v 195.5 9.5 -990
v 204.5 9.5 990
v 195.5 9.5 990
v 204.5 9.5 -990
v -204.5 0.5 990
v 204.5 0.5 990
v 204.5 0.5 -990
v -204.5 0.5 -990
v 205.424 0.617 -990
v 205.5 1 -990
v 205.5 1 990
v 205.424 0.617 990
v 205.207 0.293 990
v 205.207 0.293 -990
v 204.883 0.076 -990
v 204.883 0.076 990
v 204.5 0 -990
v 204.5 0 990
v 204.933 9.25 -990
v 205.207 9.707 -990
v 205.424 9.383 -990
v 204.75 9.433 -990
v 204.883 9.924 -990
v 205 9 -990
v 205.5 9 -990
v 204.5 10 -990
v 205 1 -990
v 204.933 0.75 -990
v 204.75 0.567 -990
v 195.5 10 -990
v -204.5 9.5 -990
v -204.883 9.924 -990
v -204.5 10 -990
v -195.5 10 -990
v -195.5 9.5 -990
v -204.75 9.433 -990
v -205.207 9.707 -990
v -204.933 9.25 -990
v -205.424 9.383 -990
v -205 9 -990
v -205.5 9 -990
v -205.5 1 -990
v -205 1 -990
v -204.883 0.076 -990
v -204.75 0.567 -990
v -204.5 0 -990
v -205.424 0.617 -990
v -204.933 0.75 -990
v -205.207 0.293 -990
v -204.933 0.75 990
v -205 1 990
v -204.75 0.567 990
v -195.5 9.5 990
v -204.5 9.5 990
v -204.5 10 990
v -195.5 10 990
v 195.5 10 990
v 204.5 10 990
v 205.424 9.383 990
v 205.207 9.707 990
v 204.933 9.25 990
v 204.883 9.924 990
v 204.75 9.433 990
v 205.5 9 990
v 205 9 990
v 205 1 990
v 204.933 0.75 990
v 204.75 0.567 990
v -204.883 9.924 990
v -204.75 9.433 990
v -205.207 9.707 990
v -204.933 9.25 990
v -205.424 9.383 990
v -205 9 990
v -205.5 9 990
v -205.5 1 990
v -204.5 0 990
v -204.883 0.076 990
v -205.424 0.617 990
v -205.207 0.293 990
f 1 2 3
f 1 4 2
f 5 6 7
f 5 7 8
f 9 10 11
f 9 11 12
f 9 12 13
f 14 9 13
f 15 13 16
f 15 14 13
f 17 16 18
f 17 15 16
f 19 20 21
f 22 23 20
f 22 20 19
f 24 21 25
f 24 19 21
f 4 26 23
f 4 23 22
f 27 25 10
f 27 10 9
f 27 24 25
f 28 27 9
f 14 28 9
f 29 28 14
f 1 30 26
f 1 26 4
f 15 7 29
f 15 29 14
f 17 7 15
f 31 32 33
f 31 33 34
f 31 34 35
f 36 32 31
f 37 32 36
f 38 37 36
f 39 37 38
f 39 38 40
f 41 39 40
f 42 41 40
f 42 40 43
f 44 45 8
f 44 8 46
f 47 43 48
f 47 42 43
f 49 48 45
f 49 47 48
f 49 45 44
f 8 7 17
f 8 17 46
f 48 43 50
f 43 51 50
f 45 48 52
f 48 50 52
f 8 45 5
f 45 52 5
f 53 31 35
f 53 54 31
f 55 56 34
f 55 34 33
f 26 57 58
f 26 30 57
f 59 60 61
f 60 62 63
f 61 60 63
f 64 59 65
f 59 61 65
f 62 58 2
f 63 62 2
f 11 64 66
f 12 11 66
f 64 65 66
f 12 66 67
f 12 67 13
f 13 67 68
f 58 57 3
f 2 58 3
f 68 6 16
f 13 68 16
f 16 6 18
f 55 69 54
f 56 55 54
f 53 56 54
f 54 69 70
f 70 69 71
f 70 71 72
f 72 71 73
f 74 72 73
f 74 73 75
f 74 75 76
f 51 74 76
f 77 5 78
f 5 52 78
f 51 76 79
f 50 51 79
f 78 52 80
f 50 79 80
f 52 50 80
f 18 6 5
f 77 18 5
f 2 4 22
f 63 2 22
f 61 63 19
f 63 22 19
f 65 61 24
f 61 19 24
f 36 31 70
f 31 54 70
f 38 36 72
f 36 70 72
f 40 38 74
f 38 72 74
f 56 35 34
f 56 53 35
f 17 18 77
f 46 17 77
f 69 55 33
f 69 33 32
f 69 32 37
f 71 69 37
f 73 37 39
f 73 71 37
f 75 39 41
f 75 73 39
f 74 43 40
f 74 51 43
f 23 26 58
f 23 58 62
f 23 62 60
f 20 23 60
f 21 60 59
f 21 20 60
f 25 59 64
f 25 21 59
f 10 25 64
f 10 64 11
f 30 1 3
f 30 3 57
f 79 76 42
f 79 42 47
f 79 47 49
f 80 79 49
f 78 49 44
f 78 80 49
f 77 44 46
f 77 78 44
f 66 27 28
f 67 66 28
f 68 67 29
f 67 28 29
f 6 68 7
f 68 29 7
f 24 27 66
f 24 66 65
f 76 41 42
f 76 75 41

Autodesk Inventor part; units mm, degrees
ref_plane "YZ Plane" through (0, 0, 0) normal (1, 0, 0) x (0, 1, 0)
ref_plane "XZ Plane" through (0, 0, 0) normal (0, 1, 0) x (-1, 0, 0)
ref_plane "XY Plane" through (0, 0, 0) normal (0, 0, 1) x (1, 0, 0)
sketch "Sketch6" plane through (0, 0, 0) normal (0, 1, 0) x (-1, 0, 0)
  line L0 (205.5, -990) -> (-205.5, -990)
  line L1 (-205.5, -990) -> (-205.5, 990)
  line L2 (-205.5, 990) -> (205.5, 990)
  line L3 (205.5, 990) -> (205.5, -990)
  line L4 (205.5, -990) -> (-205.5, 990) construction
  line L5 (-205.5, -990) -> (205.5, 990) construction
  point P0 (0, 0)
  dimension "d52" = 411
  dimension "d53" = 1980
extrude "Plate2" add sketch "Sketch6" along normal blind 0.5
sketch "Sketch12" plane through (-205, 0, 990) normal (-1, 0, 0) x (0, -1, 0)
  line L0 (0, -1980) -> (0, 0)
  line L1 (0, 0) -> (-10, 0)
  line L2 (-10, 0) -> (-10, -1980)
  line L3 (-10, -1980) -> (0, -1980)
edge flange "Flange3" height 10 angle 90 thickness 0.5 bend radius 0.5 thickness toward (-1, 0, 0) relief tear relief width 0.5 relief depth 0.25 edges at (-205.5, 0.5, 0) wall of the first edge with corners at (-205, 0, -990) (-205, 0, 990) (-205, 10, 990) (-205, 10, -990)
bend "Bend4"
corner "Corner4"
sketch "Sketch13" plane through (-205.5, 9.5, 990) normal (0, 1, 0) x (-1, 0, 0)
  line L0 (0, -1980) -> (0, 0)
  line L1 (0, 0) -> (-10, 0)
  line L2 (-10, 0) -> (-10, -1980)
  line L3 (-10, -1980) -> (0, -1980)
edge flange "Flange4" height 10 angle 90 thickness 0.5 bend radius 0.5 thickness toward (0, 1, 0) relief tear relief width 0.5 relief depth 0.25 edges at (-205, 10, 0) wall of the first edge with corners at (-205.5, 9.5, -990) (-205.5, 9.5, 990) (-195.5, 9.5, 990) (-195.5, 9.5, -990)
bend "Bend5"
corner "Corner5"
sketch "Sketch14" plane through (205, 0, -990) normal (1, 0, 0) x (0, 1, 0)
  line L0 (0, 1980) -> (0, 0)
  line L1 (0, 0) -> (10, 0)
  line L2 (10, 0) -> (10, 1980)
  line L3 (10, 1980) -> (0, 1980)
edge flange "Flange5" height 10 angle 90 thickness 0.5 bend radius 0.5 thickness toward (1, 0, 0) relief tear relief width 0.5 relief depth 0.25 edges at (205.5, 0.5, 0) wall of the first edge with corners at (205, 0, 990) (205, 0, -990) (205, 10, -990) (205, 10, 990)
bend "Bend6"
corner "Corner6"
sketch "Sketch15" plane through (205.5, 9.5, -990) normal (0, 1, 0) x (-1, 0, 0)
  line L0 (0, 1980) -> (0, 0)
  line L1 (0, 0) -> (10, 0)
  line L2 (10, 0) -> (10, 1980)
  line L3 (10, 1980) -> (0, 1980)
edge flange "Flange6" height 10 angle 90 thickness 0.5 bend radius 0.5 thickness toward (0, 1, 0) relief tear relief width 0.5 relief depth 0.25 edges at (205, 10, 0) wall of the first edge with corners at (205.5, 9.5, 990) (205.5, 9.5, -990) (195.5, 9.5, -990) (195.5, 9.5, 990)
bend "Bend7"
corner "Corner7"
equation "\"d52\" = ЖАБРЫ_базовая_ширина - 5 * ЖАБРЫ_шаг_листов"
equation "\"d53\" = ЖАБРЫ_базовая_длина_дл_лист"
equation "\"d54\" = Thickness"
equation "\"d94\" = BendReliefWidth"
equation "\"d95\" = BendReliefDepth"
equation "\"d96\" = MinimumRemnant"
equation "\"d97\" = TransitionRadius"
equation "\"d100\" = BendRadius"
equation "\"d101\" = CornerReliefSize"
equation "\"d102\" = GapSize"
equation "\"d103\" = JacobiRadiusSize"
equation "\"d104\" = BendReliefWidth"
equation "\"d105\" = BendReliefDepth"
equation "\"d106\" = MinimumRemnant"
equation "\"d107\" = TransitionRadius"
equation "\"d110\" = BendRadius"
equation "\"d111\" = CornerReliefSize"
equation "\"d112\" = GapSize"
equation "\"d113\" = JacobiRadiusSize"
equation "\"d114\" = BendReliefWidth"
equation "\"d115\" = BendReliefDepth"
equation "\"d116\" = MinimumRemnant"
equation "\"d117\" = TransitionRadius"
equation "\"d120\" = BendRadius"
equation "\"d121\" = CornerReliefSize"
equation "\"d122\" = GapSize"
equation "\"d123\" = JacobiRadiusSize"
equation "\"d124\" = BendReliefWidth"
equation "\"d125\" = BendReliefDepth"
equation "\"d126\" = MinimumRemnant"
equation "\"d127\" = TransitionRadius"
equation "\"d130\" = BendRadius"
equation "\"d131\" = CornerReliefSize"
equation "\"d132\" = GapSize"
equation "\"d133\" = JacobiRadiusSize"
equation "\"BendRadius\" = Thickness"
equation "\"BendReliefWidth\" = Thickness"
equation "\"BendReliefDepth\" = 0.5 * Thickness"
equation "\"CornerReliefSize\" = 4 * Thickness"
equation "\"MinimumRemnant\" = 2 * Thickness"
equation "\"TransitionRadius\" = BendRadius"
equation "\"JacobiRadiusSize\" = BendRadius"
equation "\"GapSize\" = Thickness"
equation "\"ЖАБРЫ_базовая_ширина\" = 915"
equation "\"ЖАБРЫ_шаг_листов\" = 100.8"
equation "\"ЖАБРЫ_базовая_длина_дл_лист\" = 1980"
equation "\"Thickness\" = 0.5"
properties part number "MSC 812 sheet gills" material "Stainless Steel"
